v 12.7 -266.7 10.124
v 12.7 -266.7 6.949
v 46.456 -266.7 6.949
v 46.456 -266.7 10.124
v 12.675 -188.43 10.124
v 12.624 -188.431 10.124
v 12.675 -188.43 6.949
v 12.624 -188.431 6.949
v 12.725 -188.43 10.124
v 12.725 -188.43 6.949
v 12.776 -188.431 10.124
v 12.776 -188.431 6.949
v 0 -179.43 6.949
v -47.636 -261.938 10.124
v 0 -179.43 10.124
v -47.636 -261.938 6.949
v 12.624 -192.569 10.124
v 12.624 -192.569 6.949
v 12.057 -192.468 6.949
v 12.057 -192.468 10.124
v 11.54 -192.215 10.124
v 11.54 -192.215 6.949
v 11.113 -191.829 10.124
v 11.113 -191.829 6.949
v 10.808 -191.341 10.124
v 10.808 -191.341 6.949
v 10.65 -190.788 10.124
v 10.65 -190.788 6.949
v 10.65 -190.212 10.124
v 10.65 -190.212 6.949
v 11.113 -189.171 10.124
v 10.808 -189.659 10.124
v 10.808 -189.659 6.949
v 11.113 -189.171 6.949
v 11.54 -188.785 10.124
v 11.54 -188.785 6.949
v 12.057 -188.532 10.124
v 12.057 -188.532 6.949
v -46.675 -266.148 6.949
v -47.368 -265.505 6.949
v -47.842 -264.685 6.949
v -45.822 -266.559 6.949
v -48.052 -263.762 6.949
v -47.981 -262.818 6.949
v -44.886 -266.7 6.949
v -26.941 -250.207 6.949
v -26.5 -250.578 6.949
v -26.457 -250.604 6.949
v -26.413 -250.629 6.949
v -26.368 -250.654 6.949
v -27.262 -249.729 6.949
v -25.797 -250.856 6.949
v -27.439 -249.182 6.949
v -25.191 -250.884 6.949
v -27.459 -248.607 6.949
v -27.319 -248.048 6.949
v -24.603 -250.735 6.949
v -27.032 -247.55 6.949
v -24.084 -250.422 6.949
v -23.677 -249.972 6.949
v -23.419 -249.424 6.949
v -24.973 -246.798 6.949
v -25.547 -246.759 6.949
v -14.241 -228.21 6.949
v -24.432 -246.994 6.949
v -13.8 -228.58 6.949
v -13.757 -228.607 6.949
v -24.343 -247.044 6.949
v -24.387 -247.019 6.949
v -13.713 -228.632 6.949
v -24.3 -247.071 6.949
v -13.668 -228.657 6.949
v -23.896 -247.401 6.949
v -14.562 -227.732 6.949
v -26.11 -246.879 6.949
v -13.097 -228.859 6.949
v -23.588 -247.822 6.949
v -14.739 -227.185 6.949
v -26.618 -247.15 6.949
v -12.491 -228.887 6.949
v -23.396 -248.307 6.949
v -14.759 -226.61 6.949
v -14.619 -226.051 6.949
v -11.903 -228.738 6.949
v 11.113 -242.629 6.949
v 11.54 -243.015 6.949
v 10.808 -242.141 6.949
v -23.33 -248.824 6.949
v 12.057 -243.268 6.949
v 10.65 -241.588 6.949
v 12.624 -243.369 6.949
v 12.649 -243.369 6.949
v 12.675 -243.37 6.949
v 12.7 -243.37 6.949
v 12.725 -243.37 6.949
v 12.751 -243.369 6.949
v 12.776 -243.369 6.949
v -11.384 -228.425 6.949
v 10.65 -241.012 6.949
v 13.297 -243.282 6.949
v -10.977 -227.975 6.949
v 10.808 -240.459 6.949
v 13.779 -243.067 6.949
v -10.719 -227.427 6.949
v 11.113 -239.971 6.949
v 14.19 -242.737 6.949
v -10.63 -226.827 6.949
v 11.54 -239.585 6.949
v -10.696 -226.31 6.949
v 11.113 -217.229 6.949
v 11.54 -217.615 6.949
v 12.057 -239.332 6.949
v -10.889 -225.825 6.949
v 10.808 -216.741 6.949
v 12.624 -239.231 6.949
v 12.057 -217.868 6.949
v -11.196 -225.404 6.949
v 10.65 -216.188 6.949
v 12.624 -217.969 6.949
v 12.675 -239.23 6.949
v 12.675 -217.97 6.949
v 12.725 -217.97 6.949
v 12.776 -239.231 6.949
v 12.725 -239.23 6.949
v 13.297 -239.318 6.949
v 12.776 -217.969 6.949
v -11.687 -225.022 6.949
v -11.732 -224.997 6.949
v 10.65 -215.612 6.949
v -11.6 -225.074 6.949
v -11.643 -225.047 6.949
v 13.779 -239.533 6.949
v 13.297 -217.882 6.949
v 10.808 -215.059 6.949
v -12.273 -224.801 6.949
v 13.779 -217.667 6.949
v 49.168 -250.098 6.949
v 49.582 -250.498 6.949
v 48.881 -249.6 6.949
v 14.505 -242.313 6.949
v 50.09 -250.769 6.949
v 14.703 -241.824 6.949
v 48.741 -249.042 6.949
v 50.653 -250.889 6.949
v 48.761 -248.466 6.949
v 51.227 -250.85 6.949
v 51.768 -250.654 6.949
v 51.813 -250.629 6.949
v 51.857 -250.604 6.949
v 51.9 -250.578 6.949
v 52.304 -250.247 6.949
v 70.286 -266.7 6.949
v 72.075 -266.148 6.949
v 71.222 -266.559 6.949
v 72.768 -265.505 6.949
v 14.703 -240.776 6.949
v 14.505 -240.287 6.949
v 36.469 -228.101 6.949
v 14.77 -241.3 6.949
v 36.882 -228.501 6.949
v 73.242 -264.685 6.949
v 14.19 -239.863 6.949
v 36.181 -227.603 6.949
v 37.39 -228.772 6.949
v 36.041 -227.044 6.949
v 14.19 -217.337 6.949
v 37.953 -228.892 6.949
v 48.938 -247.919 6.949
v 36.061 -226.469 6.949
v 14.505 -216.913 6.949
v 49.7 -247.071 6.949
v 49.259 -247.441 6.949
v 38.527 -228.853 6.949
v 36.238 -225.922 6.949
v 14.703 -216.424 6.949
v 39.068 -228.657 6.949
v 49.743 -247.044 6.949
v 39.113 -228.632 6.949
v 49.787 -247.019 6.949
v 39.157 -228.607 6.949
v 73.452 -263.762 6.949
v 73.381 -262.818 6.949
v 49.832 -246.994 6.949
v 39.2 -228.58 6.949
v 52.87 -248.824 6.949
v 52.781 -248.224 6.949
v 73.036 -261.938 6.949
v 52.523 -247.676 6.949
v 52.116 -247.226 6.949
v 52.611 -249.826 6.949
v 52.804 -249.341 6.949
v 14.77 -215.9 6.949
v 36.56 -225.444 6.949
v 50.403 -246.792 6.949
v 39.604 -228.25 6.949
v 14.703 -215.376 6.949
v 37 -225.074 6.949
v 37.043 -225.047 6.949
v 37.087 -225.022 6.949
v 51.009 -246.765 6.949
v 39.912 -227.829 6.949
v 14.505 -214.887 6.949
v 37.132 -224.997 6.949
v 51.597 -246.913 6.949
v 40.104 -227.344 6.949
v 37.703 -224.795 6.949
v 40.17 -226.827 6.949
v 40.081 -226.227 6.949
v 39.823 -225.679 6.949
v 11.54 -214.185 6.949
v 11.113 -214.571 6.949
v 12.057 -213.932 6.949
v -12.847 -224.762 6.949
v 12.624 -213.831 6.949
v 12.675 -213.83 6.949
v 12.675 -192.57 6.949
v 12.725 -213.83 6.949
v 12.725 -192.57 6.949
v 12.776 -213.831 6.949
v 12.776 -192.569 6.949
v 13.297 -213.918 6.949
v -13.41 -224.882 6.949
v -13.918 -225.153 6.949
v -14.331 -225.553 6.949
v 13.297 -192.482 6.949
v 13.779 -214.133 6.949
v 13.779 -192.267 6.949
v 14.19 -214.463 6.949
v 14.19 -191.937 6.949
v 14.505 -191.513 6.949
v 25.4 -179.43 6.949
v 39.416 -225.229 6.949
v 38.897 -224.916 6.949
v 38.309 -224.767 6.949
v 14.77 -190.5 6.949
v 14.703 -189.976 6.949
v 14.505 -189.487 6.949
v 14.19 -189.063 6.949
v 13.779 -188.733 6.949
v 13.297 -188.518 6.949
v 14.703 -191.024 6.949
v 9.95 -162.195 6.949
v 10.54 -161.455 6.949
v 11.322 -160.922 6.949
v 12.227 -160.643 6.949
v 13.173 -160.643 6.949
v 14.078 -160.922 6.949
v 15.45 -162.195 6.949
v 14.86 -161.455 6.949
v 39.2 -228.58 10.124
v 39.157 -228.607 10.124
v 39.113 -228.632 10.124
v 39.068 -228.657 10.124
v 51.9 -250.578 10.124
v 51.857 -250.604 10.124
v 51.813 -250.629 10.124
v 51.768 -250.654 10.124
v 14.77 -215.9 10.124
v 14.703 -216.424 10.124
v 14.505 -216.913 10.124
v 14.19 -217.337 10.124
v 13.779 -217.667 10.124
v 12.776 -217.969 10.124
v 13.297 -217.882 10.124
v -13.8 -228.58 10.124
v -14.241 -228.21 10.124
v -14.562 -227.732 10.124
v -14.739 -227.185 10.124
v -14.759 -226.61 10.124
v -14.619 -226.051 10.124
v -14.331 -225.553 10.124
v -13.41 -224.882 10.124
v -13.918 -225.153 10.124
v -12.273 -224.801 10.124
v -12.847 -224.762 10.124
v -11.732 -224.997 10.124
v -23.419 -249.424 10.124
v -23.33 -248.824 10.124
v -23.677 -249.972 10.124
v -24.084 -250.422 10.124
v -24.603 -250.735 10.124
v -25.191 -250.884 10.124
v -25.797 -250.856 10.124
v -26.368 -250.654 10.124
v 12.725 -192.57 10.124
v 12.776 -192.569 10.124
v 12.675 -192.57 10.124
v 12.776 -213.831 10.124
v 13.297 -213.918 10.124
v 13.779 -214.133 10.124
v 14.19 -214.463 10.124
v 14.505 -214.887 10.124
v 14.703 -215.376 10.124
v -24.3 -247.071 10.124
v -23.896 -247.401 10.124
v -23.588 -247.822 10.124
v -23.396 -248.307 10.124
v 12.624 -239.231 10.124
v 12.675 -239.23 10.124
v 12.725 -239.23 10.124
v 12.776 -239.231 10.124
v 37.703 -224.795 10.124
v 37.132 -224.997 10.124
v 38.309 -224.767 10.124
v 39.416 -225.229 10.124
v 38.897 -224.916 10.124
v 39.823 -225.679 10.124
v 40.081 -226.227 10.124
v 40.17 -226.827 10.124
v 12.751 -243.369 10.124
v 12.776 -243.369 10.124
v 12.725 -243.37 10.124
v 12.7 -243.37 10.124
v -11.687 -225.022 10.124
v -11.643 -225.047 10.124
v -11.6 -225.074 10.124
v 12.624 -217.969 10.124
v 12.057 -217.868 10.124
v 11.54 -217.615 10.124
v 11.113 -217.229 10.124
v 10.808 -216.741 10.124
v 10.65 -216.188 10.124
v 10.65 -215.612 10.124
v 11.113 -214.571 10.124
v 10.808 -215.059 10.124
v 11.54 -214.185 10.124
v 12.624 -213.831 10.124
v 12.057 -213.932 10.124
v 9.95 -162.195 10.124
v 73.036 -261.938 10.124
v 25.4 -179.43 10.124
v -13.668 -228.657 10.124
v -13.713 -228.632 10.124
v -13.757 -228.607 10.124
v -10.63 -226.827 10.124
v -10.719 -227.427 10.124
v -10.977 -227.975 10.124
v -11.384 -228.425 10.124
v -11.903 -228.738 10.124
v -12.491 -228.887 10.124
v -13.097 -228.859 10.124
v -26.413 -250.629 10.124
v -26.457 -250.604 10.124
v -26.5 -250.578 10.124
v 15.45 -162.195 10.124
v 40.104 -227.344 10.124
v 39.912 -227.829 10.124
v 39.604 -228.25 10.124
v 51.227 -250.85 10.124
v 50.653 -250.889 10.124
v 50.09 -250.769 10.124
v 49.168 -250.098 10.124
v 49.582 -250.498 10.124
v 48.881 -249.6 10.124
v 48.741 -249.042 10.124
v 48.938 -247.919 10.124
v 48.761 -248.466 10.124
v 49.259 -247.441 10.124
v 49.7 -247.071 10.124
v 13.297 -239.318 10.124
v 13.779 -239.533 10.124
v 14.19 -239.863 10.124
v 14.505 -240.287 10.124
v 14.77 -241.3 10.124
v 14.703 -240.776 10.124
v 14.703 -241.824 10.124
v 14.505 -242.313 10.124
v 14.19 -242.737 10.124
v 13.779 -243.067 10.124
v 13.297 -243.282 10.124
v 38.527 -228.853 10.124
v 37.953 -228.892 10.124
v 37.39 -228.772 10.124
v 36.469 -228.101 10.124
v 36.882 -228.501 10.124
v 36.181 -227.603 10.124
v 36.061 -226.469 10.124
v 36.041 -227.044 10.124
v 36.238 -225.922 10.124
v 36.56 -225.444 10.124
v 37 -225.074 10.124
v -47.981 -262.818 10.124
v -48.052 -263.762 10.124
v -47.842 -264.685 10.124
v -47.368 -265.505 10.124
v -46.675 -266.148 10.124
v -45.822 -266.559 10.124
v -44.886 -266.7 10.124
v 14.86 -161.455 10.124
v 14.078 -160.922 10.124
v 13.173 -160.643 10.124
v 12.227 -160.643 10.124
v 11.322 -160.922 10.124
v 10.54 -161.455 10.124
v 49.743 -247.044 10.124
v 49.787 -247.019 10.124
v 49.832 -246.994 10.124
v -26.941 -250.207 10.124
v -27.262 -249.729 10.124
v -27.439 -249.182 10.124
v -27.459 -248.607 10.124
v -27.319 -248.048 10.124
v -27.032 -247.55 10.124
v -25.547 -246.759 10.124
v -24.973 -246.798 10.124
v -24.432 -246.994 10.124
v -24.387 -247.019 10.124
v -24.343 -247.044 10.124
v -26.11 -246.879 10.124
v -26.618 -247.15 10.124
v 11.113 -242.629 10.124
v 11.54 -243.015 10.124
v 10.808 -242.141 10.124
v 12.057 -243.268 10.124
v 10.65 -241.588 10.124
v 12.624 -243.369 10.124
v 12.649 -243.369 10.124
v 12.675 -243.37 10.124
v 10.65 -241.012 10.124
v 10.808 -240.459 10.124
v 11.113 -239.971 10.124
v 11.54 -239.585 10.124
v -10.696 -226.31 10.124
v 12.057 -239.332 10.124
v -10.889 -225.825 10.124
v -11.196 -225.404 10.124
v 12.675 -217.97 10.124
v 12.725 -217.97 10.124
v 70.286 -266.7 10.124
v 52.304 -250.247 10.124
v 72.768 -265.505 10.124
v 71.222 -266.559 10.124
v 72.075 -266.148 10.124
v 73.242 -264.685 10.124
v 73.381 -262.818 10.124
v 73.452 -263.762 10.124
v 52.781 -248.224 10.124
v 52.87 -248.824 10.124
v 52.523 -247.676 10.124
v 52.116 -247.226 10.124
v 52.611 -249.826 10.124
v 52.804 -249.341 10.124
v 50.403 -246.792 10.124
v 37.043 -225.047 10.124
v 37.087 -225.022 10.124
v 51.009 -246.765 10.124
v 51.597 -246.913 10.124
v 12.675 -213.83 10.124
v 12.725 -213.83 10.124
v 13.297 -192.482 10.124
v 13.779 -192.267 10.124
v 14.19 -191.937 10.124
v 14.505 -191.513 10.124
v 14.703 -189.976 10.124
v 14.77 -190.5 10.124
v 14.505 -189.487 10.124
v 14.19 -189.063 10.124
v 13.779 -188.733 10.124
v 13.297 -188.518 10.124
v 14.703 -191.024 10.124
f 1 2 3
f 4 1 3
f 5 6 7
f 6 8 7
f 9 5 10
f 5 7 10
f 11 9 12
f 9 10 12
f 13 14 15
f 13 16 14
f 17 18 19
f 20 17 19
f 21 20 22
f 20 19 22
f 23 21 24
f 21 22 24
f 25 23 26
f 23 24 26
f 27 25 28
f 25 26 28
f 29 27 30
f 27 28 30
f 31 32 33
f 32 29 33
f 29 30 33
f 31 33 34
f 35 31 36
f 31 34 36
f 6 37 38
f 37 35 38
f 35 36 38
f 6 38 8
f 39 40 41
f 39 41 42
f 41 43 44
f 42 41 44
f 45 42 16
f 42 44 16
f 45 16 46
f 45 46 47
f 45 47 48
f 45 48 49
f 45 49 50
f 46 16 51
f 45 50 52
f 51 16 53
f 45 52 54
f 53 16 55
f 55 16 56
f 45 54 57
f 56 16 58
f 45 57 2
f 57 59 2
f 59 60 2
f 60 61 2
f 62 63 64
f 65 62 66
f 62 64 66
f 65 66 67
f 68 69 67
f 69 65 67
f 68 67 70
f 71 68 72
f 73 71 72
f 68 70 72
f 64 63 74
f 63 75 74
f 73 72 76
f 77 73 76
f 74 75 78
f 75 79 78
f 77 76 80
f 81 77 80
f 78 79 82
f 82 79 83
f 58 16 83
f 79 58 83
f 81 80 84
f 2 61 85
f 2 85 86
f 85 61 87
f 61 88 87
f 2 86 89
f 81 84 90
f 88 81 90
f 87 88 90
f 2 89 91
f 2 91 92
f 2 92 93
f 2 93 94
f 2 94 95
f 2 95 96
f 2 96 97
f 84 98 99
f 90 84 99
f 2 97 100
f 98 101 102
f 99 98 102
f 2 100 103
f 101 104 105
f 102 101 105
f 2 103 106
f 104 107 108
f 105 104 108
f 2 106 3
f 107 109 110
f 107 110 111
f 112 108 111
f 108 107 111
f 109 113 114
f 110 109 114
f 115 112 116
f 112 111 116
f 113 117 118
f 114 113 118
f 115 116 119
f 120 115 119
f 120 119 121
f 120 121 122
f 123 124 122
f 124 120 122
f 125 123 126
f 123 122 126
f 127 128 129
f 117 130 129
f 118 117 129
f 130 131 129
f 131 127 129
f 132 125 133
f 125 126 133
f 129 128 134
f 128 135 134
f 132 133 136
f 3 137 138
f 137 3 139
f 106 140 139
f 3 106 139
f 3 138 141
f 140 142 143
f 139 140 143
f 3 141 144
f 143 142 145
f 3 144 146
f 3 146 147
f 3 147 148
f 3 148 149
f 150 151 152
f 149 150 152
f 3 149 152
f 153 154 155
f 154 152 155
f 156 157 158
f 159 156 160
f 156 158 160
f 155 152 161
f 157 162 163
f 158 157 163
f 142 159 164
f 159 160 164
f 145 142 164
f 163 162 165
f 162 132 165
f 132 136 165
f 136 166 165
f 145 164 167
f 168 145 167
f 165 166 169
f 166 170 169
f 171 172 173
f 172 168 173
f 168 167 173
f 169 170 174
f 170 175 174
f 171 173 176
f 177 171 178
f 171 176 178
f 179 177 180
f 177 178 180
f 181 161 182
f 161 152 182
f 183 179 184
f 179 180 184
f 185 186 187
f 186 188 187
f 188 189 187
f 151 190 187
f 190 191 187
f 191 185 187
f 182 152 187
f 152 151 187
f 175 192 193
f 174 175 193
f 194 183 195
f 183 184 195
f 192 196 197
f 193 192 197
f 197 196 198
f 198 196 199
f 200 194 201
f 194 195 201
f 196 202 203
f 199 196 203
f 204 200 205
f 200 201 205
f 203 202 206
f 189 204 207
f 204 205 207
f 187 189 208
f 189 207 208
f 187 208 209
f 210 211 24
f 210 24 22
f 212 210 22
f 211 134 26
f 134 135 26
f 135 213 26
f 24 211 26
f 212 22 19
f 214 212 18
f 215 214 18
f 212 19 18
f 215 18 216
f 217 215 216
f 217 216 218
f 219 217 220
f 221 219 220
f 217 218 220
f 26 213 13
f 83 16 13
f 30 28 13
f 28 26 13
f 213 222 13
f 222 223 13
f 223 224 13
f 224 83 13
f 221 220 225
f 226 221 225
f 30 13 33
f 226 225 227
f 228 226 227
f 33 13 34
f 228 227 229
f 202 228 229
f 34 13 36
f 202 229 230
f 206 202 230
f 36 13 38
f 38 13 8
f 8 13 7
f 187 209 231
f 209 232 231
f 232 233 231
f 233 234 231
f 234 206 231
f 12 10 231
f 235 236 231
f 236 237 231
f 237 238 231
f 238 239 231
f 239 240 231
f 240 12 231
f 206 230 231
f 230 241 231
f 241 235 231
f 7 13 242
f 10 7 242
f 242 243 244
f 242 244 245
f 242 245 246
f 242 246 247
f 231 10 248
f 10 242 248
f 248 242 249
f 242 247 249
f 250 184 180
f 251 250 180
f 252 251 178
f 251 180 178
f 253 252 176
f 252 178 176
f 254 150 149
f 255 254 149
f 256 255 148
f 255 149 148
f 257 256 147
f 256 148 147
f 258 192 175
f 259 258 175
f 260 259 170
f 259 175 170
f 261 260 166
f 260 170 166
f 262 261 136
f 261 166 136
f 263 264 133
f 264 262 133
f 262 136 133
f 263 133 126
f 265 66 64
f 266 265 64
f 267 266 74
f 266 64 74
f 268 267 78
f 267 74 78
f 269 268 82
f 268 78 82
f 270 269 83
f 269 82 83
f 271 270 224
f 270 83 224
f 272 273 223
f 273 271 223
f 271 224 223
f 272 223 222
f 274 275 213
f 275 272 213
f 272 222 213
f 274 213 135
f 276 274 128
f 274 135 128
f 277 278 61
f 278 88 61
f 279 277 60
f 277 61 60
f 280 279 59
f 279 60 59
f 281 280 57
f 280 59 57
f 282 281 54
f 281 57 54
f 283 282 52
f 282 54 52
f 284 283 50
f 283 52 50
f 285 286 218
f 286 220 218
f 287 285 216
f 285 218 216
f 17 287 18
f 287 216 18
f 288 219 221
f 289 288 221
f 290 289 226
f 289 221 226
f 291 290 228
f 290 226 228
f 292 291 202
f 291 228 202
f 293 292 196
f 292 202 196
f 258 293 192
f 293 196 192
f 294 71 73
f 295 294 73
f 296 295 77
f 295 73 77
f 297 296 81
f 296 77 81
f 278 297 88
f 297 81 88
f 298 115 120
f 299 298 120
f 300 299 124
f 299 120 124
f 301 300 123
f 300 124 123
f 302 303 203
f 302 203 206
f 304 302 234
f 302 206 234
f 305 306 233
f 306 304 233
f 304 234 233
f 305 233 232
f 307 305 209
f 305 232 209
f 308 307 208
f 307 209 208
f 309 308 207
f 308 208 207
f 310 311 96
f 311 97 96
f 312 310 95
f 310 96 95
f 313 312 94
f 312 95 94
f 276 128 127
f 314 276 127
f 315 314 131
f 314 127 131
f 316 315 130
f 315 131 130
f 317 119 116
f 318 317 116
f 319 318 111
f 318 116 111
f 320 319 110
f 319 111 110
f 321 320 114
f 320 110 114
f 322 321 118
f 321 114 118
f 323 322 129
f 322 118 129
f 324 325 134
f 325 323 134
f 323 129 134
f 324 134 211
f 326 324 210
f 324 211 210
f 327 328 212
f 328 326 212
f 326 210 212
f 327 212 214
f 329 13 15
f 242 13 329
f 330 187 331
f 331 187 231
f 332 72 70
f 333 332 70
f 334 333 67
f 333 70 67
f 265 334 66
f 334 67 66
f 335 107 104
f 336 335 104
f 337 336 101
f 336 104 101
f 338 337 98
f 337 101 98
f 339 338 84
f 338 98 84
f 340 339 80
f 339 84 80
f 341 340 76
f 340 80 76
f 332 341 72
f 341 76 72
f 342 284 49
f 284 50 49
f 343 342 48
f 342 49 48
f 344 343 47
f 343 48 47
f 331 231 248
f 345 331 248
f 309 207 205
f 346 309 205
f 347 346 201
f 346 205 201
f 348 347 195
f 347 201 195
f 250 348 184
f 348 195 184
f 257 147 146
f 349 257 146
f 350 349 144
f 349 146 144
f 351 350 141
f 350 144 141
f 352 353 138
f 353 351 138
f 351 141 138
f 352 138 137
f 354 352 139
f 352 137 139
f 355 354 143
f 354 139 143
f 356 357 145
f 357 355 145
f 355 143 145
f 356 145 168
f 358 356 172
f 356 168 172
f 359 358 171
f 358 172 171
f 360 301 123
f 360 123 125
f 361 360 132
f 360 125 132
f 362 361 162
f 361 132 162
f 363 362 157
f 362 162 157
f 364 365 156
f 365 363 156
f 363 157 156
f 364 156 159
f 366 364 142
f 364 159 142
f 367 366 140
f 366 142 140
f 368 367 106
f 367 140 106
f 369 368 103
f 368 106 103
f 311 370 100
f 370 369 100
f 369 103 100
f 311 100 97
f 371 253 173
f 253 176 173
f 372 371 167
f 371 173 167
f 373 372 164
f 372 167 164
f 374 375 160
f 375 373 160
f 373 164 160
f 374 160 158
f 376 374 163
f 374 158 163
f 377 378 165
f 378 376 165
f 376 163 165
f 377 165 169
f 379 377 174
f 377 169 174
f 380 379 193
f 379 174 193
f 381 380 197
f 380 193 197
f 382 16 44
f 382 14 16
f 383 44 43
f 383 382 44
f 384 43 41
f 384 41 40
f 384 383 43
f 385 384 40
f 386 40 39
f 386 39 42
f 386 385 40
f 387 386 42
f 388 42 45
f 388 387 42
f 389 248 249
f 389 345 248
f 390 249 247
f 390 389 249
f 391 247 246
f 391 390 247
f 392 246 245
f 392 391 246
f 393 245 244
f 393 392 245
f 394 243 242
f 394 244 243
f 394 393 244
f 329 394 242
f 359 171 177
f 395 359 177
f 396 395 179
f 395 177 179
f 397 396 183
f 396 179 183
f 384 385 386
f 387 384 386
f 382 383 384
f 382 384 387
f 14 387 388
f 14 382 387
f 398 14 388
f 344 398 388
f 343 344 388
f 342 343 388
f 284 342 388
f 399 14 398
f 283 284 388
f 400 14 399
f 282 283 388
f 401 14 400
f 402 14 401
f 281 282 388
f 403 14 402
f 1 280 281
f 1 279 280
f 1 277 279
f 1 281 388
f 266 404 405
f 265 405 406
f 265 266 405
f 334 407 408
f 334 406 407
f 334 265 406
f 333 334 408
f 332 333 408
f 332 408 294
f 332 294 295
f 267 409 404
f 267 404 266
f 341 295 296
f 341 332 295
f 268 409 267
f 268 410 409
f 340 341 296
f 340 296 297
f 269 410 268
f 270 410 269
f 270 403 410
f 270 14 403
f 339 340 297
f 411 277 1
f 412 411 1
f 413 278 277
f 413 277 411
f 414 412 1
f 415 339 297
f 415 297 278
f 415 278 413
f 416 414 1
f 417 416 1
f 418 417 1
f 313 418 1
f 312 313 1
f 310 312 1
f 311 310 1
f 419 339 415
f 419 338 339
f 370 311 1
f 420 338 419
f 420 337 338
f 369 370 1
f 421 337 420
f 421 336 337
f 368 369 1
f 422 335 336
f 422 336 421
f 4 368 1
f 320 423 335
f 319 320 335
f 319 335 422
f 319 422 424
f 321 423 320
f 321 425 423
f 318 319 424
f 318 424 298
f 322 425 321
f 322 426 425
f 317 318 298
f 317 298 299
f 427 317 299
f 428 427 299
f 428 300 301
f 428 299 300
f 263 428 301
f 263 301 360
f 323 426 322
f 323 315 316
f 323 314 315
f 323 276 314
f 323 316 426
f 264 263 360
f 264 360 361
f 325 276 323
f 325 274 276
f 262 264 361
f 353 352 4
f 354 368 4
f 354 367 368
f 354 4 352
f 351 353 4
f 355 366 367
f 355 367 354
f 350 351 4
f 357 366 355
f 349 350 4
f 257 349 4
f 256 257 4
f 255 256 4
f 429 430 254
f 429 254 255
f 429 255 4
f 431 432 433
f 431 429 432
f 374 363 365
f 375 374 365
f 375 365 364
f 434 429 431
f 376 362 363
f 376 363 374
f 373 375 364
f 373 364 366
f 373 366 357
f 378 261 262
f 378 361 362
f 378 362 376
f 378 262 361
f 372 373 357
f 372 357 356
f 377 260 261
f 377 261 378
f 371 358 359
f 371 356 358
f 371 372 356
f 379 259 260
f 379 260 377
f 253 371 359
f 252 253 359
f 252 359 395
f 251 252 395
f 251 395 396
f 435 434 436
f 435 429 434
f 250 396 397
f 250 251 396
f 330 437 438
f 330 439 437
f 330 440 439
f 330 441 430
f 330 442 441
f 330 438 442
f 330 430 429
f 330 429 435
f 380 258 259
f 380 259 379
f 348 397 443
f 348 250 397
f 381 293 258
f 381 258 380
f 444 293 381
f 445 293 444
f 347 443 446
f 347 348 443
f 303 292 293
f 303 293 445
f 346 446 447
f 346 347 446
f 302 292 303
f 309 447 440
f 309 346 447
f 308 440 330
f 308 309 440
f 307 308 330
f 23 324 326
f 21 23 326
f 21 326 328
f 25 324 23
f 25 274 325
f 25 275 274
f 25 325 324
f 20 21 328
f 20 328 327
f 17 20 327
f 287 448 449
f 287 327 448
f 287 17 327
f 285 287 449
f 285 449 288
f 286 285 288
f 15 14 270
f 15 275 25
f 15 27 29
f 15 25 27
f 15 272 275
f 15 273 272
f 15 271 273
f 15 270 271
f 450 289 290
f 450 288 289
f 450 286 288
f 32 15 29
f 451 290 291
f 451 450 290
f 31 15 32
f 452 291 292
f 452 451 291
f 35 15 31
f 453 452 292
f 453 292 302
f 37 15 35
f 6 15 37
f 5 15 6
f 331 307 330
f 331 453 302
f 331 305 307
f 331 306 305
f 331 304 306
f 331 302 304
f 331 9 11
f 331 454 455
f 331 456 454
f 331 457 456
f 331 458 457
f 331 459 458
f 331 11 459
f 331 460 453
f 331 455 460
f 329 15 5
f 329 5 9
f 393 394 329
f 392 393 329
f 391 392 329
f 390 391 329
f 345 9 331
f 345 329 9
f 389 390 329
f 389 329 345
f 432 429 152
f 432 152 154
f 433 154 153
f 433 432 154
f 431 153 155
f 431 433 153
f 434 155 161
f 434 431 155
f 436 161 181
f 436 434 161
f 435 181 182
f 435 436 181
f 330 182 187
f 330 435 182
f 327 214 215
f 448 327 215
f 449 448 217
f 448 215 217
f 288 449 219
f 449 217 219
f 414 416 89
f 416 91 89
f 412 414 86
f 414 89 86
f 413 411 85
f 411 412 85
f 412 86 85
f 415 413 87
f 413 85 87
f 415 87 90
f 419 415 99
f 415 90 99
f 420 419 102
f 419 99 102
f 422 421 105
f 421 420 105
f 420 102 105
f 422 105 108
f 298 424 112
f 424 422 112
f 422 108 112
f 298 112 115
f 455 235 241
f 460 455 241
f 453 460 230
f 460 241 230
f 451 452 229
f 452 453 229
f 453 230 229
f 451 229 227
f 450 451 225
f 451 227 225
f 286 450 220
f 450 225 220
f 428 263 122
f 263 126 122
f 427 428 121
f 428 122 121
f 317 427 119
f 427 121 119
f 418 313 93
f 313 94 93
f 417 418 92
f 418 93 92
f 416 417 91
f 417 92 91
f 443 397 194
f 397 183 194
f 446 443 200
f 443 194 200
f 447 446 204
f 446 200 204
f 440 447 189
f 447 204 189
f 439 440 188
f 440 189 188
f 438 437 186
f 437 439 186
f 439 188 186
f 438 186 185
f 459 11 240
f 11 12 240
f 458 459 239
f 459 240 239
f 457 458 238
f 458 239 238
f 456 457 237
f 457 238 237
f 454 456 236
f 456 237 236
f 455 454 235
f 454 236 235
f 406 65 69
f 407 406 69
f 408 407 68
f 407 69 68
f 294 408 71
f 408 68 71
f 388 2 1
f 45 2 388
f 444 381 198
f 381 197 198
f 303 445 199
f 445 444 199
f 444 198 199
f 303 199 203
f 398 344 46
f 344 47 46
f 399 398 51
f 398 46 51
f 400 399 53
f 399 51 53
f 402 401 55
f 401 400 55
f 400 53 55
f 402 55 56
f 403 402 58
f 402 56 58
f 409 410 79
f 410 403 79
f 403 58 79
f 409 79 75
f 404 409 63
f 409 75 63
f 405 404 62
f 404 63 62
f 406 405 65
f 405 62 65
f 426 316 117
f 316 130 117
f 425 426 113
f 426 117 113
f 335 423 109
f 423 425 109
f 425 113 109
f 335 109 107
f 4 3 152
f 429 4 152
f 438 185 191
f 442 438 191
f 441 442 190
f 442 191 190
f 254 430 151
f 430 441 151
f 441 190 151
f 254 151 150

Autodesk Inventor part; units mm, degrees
ref_plane "YZ Plane" through (0, 0, 0) normal (1, 0, 0) x (0, 1, 0)
ref_plane "XZ Plane" through (0, 0, 0) normal (0, 1, 0) x (-1, 0, 0)
ref_plane "XY Plane" through (0, 0, 0) normal (0, 0, 1) x (1, 0, 0)
ref_plane "Work Plane1" through (0, 0, 6.9486) normal (0, 0, 1) x (1, 0, 0)
sketch "Sketch1" plane through (0, 0, 6.9486) normal (0, 0, 1) x (1, 0, 0)
  line L0 (-228.6, -575.3768) -> (0, -179.43) projected
  line L1 (254, -575.3768) -> (25.4, -179.43) projected
  line L2 (254, -626.1768) -> (25.4, -230.23) projected
  arc A0 (51.9003, -250.5775) -> (49.8316, -246.9944) centre (50.8, -248.8241) ccw projected
  arc A1 (49.6997, -247.0706) -> (51.7684, -250.6537) centre (50.8, -248.8241) ccw projected
  arc A2 (39.2003, -228.5805) -> (37.1316, -224.9974) centre (38.1, -226.827) ccw projected
  arc A3 (36.9997, -225.0736) -> (39.0684, -228.6567) centre (38.1, -226.827) ccw projected
  arc A4 (12.7762, -217.9687) -> (12.7762, -213.8313) centre (12.7, -215.9) ccw projected
  arc A5 (12.6238, -213.8313) -> (12.6238, -217.9687) centre (12.7, -215.9) ccw projected
  arc A6 (12.6238, -188.4313) -> (12.6238, -192.5687) centre (12.7, -190.5) ccw projected
  arc A7 (12.7762, -192.5687) -> (12.7762, -188.4313) centre (12.7, -190.5) ccw projected
  arc A8 (12.7762, -243.3687) -> (12.7762, -239.2313) centre (12.7, -241.3) ccw projected
  arc A9 (12.6238, -239.2313) -> (12.6238, -243.3687) centre (12.7, -241.3) ccw projected
  arc A10 (-26.3684, -250.6537) -> (-24.2997, -247.0706) centre (-25.4, -248.8241) ccw projected
  arc A11 (-24.4316, -246.9944) -> (-26.5003, -250.5775) centre (-25.4, -248.8241) ccw projected
  arc A12 (-13.6684, -228.6567) -> (-11.5997, -225.0736) centre (-12.7, -226.827) ccw projected
  arc A13 (-11.7316, -224.9974) -> (-13.8003, -228.5805) centre (-12.7, -226.827) ccw projected
  line L3 (12.7, -241.3) -> (12.7, -266.7)
  line L4 (12.7, -266.7) -> (-50.3854, -266.7)
  line L5 (12.7, -266.7) -> (75.7854, -266.7)
  line L6 (75.7854, -266.7) -> (12.7, -157.4329)
  line L7 (-50.3854, -266.7) -> (12.7, -157.4329)
  circle A14 centre (12.7, -190.5) radius 2.0701
  circle A15 centre (12.7, -215.9) radius 2.0701
  circle A16 centre (12.7, -241.3) radius 2.0701
  circle A17 centre (-25.4, -248.8241) radius 2.0701
  circle A18 centre (-12.7, -226.827) radius 2.0701
  circle A19 centre (50.8, -248.8241) radius 2.0701
  circle A20 centre (38.1, -226.827) radius 2.0701
  point P0 (0, 0)
  dimension "d0" = 25.4
extrude "Extrusion1" add sketch "Sketch1" along normal blind 3.175
fillet "Fillet1" radius 3.175 3 edges at (12.7, -157.4329, 8.5361) (-50.3854, -266.7, 8.5361) (75.7854, -266.7, 8.5361)
properties part number "jointplate" material "Aluminum 6061"
